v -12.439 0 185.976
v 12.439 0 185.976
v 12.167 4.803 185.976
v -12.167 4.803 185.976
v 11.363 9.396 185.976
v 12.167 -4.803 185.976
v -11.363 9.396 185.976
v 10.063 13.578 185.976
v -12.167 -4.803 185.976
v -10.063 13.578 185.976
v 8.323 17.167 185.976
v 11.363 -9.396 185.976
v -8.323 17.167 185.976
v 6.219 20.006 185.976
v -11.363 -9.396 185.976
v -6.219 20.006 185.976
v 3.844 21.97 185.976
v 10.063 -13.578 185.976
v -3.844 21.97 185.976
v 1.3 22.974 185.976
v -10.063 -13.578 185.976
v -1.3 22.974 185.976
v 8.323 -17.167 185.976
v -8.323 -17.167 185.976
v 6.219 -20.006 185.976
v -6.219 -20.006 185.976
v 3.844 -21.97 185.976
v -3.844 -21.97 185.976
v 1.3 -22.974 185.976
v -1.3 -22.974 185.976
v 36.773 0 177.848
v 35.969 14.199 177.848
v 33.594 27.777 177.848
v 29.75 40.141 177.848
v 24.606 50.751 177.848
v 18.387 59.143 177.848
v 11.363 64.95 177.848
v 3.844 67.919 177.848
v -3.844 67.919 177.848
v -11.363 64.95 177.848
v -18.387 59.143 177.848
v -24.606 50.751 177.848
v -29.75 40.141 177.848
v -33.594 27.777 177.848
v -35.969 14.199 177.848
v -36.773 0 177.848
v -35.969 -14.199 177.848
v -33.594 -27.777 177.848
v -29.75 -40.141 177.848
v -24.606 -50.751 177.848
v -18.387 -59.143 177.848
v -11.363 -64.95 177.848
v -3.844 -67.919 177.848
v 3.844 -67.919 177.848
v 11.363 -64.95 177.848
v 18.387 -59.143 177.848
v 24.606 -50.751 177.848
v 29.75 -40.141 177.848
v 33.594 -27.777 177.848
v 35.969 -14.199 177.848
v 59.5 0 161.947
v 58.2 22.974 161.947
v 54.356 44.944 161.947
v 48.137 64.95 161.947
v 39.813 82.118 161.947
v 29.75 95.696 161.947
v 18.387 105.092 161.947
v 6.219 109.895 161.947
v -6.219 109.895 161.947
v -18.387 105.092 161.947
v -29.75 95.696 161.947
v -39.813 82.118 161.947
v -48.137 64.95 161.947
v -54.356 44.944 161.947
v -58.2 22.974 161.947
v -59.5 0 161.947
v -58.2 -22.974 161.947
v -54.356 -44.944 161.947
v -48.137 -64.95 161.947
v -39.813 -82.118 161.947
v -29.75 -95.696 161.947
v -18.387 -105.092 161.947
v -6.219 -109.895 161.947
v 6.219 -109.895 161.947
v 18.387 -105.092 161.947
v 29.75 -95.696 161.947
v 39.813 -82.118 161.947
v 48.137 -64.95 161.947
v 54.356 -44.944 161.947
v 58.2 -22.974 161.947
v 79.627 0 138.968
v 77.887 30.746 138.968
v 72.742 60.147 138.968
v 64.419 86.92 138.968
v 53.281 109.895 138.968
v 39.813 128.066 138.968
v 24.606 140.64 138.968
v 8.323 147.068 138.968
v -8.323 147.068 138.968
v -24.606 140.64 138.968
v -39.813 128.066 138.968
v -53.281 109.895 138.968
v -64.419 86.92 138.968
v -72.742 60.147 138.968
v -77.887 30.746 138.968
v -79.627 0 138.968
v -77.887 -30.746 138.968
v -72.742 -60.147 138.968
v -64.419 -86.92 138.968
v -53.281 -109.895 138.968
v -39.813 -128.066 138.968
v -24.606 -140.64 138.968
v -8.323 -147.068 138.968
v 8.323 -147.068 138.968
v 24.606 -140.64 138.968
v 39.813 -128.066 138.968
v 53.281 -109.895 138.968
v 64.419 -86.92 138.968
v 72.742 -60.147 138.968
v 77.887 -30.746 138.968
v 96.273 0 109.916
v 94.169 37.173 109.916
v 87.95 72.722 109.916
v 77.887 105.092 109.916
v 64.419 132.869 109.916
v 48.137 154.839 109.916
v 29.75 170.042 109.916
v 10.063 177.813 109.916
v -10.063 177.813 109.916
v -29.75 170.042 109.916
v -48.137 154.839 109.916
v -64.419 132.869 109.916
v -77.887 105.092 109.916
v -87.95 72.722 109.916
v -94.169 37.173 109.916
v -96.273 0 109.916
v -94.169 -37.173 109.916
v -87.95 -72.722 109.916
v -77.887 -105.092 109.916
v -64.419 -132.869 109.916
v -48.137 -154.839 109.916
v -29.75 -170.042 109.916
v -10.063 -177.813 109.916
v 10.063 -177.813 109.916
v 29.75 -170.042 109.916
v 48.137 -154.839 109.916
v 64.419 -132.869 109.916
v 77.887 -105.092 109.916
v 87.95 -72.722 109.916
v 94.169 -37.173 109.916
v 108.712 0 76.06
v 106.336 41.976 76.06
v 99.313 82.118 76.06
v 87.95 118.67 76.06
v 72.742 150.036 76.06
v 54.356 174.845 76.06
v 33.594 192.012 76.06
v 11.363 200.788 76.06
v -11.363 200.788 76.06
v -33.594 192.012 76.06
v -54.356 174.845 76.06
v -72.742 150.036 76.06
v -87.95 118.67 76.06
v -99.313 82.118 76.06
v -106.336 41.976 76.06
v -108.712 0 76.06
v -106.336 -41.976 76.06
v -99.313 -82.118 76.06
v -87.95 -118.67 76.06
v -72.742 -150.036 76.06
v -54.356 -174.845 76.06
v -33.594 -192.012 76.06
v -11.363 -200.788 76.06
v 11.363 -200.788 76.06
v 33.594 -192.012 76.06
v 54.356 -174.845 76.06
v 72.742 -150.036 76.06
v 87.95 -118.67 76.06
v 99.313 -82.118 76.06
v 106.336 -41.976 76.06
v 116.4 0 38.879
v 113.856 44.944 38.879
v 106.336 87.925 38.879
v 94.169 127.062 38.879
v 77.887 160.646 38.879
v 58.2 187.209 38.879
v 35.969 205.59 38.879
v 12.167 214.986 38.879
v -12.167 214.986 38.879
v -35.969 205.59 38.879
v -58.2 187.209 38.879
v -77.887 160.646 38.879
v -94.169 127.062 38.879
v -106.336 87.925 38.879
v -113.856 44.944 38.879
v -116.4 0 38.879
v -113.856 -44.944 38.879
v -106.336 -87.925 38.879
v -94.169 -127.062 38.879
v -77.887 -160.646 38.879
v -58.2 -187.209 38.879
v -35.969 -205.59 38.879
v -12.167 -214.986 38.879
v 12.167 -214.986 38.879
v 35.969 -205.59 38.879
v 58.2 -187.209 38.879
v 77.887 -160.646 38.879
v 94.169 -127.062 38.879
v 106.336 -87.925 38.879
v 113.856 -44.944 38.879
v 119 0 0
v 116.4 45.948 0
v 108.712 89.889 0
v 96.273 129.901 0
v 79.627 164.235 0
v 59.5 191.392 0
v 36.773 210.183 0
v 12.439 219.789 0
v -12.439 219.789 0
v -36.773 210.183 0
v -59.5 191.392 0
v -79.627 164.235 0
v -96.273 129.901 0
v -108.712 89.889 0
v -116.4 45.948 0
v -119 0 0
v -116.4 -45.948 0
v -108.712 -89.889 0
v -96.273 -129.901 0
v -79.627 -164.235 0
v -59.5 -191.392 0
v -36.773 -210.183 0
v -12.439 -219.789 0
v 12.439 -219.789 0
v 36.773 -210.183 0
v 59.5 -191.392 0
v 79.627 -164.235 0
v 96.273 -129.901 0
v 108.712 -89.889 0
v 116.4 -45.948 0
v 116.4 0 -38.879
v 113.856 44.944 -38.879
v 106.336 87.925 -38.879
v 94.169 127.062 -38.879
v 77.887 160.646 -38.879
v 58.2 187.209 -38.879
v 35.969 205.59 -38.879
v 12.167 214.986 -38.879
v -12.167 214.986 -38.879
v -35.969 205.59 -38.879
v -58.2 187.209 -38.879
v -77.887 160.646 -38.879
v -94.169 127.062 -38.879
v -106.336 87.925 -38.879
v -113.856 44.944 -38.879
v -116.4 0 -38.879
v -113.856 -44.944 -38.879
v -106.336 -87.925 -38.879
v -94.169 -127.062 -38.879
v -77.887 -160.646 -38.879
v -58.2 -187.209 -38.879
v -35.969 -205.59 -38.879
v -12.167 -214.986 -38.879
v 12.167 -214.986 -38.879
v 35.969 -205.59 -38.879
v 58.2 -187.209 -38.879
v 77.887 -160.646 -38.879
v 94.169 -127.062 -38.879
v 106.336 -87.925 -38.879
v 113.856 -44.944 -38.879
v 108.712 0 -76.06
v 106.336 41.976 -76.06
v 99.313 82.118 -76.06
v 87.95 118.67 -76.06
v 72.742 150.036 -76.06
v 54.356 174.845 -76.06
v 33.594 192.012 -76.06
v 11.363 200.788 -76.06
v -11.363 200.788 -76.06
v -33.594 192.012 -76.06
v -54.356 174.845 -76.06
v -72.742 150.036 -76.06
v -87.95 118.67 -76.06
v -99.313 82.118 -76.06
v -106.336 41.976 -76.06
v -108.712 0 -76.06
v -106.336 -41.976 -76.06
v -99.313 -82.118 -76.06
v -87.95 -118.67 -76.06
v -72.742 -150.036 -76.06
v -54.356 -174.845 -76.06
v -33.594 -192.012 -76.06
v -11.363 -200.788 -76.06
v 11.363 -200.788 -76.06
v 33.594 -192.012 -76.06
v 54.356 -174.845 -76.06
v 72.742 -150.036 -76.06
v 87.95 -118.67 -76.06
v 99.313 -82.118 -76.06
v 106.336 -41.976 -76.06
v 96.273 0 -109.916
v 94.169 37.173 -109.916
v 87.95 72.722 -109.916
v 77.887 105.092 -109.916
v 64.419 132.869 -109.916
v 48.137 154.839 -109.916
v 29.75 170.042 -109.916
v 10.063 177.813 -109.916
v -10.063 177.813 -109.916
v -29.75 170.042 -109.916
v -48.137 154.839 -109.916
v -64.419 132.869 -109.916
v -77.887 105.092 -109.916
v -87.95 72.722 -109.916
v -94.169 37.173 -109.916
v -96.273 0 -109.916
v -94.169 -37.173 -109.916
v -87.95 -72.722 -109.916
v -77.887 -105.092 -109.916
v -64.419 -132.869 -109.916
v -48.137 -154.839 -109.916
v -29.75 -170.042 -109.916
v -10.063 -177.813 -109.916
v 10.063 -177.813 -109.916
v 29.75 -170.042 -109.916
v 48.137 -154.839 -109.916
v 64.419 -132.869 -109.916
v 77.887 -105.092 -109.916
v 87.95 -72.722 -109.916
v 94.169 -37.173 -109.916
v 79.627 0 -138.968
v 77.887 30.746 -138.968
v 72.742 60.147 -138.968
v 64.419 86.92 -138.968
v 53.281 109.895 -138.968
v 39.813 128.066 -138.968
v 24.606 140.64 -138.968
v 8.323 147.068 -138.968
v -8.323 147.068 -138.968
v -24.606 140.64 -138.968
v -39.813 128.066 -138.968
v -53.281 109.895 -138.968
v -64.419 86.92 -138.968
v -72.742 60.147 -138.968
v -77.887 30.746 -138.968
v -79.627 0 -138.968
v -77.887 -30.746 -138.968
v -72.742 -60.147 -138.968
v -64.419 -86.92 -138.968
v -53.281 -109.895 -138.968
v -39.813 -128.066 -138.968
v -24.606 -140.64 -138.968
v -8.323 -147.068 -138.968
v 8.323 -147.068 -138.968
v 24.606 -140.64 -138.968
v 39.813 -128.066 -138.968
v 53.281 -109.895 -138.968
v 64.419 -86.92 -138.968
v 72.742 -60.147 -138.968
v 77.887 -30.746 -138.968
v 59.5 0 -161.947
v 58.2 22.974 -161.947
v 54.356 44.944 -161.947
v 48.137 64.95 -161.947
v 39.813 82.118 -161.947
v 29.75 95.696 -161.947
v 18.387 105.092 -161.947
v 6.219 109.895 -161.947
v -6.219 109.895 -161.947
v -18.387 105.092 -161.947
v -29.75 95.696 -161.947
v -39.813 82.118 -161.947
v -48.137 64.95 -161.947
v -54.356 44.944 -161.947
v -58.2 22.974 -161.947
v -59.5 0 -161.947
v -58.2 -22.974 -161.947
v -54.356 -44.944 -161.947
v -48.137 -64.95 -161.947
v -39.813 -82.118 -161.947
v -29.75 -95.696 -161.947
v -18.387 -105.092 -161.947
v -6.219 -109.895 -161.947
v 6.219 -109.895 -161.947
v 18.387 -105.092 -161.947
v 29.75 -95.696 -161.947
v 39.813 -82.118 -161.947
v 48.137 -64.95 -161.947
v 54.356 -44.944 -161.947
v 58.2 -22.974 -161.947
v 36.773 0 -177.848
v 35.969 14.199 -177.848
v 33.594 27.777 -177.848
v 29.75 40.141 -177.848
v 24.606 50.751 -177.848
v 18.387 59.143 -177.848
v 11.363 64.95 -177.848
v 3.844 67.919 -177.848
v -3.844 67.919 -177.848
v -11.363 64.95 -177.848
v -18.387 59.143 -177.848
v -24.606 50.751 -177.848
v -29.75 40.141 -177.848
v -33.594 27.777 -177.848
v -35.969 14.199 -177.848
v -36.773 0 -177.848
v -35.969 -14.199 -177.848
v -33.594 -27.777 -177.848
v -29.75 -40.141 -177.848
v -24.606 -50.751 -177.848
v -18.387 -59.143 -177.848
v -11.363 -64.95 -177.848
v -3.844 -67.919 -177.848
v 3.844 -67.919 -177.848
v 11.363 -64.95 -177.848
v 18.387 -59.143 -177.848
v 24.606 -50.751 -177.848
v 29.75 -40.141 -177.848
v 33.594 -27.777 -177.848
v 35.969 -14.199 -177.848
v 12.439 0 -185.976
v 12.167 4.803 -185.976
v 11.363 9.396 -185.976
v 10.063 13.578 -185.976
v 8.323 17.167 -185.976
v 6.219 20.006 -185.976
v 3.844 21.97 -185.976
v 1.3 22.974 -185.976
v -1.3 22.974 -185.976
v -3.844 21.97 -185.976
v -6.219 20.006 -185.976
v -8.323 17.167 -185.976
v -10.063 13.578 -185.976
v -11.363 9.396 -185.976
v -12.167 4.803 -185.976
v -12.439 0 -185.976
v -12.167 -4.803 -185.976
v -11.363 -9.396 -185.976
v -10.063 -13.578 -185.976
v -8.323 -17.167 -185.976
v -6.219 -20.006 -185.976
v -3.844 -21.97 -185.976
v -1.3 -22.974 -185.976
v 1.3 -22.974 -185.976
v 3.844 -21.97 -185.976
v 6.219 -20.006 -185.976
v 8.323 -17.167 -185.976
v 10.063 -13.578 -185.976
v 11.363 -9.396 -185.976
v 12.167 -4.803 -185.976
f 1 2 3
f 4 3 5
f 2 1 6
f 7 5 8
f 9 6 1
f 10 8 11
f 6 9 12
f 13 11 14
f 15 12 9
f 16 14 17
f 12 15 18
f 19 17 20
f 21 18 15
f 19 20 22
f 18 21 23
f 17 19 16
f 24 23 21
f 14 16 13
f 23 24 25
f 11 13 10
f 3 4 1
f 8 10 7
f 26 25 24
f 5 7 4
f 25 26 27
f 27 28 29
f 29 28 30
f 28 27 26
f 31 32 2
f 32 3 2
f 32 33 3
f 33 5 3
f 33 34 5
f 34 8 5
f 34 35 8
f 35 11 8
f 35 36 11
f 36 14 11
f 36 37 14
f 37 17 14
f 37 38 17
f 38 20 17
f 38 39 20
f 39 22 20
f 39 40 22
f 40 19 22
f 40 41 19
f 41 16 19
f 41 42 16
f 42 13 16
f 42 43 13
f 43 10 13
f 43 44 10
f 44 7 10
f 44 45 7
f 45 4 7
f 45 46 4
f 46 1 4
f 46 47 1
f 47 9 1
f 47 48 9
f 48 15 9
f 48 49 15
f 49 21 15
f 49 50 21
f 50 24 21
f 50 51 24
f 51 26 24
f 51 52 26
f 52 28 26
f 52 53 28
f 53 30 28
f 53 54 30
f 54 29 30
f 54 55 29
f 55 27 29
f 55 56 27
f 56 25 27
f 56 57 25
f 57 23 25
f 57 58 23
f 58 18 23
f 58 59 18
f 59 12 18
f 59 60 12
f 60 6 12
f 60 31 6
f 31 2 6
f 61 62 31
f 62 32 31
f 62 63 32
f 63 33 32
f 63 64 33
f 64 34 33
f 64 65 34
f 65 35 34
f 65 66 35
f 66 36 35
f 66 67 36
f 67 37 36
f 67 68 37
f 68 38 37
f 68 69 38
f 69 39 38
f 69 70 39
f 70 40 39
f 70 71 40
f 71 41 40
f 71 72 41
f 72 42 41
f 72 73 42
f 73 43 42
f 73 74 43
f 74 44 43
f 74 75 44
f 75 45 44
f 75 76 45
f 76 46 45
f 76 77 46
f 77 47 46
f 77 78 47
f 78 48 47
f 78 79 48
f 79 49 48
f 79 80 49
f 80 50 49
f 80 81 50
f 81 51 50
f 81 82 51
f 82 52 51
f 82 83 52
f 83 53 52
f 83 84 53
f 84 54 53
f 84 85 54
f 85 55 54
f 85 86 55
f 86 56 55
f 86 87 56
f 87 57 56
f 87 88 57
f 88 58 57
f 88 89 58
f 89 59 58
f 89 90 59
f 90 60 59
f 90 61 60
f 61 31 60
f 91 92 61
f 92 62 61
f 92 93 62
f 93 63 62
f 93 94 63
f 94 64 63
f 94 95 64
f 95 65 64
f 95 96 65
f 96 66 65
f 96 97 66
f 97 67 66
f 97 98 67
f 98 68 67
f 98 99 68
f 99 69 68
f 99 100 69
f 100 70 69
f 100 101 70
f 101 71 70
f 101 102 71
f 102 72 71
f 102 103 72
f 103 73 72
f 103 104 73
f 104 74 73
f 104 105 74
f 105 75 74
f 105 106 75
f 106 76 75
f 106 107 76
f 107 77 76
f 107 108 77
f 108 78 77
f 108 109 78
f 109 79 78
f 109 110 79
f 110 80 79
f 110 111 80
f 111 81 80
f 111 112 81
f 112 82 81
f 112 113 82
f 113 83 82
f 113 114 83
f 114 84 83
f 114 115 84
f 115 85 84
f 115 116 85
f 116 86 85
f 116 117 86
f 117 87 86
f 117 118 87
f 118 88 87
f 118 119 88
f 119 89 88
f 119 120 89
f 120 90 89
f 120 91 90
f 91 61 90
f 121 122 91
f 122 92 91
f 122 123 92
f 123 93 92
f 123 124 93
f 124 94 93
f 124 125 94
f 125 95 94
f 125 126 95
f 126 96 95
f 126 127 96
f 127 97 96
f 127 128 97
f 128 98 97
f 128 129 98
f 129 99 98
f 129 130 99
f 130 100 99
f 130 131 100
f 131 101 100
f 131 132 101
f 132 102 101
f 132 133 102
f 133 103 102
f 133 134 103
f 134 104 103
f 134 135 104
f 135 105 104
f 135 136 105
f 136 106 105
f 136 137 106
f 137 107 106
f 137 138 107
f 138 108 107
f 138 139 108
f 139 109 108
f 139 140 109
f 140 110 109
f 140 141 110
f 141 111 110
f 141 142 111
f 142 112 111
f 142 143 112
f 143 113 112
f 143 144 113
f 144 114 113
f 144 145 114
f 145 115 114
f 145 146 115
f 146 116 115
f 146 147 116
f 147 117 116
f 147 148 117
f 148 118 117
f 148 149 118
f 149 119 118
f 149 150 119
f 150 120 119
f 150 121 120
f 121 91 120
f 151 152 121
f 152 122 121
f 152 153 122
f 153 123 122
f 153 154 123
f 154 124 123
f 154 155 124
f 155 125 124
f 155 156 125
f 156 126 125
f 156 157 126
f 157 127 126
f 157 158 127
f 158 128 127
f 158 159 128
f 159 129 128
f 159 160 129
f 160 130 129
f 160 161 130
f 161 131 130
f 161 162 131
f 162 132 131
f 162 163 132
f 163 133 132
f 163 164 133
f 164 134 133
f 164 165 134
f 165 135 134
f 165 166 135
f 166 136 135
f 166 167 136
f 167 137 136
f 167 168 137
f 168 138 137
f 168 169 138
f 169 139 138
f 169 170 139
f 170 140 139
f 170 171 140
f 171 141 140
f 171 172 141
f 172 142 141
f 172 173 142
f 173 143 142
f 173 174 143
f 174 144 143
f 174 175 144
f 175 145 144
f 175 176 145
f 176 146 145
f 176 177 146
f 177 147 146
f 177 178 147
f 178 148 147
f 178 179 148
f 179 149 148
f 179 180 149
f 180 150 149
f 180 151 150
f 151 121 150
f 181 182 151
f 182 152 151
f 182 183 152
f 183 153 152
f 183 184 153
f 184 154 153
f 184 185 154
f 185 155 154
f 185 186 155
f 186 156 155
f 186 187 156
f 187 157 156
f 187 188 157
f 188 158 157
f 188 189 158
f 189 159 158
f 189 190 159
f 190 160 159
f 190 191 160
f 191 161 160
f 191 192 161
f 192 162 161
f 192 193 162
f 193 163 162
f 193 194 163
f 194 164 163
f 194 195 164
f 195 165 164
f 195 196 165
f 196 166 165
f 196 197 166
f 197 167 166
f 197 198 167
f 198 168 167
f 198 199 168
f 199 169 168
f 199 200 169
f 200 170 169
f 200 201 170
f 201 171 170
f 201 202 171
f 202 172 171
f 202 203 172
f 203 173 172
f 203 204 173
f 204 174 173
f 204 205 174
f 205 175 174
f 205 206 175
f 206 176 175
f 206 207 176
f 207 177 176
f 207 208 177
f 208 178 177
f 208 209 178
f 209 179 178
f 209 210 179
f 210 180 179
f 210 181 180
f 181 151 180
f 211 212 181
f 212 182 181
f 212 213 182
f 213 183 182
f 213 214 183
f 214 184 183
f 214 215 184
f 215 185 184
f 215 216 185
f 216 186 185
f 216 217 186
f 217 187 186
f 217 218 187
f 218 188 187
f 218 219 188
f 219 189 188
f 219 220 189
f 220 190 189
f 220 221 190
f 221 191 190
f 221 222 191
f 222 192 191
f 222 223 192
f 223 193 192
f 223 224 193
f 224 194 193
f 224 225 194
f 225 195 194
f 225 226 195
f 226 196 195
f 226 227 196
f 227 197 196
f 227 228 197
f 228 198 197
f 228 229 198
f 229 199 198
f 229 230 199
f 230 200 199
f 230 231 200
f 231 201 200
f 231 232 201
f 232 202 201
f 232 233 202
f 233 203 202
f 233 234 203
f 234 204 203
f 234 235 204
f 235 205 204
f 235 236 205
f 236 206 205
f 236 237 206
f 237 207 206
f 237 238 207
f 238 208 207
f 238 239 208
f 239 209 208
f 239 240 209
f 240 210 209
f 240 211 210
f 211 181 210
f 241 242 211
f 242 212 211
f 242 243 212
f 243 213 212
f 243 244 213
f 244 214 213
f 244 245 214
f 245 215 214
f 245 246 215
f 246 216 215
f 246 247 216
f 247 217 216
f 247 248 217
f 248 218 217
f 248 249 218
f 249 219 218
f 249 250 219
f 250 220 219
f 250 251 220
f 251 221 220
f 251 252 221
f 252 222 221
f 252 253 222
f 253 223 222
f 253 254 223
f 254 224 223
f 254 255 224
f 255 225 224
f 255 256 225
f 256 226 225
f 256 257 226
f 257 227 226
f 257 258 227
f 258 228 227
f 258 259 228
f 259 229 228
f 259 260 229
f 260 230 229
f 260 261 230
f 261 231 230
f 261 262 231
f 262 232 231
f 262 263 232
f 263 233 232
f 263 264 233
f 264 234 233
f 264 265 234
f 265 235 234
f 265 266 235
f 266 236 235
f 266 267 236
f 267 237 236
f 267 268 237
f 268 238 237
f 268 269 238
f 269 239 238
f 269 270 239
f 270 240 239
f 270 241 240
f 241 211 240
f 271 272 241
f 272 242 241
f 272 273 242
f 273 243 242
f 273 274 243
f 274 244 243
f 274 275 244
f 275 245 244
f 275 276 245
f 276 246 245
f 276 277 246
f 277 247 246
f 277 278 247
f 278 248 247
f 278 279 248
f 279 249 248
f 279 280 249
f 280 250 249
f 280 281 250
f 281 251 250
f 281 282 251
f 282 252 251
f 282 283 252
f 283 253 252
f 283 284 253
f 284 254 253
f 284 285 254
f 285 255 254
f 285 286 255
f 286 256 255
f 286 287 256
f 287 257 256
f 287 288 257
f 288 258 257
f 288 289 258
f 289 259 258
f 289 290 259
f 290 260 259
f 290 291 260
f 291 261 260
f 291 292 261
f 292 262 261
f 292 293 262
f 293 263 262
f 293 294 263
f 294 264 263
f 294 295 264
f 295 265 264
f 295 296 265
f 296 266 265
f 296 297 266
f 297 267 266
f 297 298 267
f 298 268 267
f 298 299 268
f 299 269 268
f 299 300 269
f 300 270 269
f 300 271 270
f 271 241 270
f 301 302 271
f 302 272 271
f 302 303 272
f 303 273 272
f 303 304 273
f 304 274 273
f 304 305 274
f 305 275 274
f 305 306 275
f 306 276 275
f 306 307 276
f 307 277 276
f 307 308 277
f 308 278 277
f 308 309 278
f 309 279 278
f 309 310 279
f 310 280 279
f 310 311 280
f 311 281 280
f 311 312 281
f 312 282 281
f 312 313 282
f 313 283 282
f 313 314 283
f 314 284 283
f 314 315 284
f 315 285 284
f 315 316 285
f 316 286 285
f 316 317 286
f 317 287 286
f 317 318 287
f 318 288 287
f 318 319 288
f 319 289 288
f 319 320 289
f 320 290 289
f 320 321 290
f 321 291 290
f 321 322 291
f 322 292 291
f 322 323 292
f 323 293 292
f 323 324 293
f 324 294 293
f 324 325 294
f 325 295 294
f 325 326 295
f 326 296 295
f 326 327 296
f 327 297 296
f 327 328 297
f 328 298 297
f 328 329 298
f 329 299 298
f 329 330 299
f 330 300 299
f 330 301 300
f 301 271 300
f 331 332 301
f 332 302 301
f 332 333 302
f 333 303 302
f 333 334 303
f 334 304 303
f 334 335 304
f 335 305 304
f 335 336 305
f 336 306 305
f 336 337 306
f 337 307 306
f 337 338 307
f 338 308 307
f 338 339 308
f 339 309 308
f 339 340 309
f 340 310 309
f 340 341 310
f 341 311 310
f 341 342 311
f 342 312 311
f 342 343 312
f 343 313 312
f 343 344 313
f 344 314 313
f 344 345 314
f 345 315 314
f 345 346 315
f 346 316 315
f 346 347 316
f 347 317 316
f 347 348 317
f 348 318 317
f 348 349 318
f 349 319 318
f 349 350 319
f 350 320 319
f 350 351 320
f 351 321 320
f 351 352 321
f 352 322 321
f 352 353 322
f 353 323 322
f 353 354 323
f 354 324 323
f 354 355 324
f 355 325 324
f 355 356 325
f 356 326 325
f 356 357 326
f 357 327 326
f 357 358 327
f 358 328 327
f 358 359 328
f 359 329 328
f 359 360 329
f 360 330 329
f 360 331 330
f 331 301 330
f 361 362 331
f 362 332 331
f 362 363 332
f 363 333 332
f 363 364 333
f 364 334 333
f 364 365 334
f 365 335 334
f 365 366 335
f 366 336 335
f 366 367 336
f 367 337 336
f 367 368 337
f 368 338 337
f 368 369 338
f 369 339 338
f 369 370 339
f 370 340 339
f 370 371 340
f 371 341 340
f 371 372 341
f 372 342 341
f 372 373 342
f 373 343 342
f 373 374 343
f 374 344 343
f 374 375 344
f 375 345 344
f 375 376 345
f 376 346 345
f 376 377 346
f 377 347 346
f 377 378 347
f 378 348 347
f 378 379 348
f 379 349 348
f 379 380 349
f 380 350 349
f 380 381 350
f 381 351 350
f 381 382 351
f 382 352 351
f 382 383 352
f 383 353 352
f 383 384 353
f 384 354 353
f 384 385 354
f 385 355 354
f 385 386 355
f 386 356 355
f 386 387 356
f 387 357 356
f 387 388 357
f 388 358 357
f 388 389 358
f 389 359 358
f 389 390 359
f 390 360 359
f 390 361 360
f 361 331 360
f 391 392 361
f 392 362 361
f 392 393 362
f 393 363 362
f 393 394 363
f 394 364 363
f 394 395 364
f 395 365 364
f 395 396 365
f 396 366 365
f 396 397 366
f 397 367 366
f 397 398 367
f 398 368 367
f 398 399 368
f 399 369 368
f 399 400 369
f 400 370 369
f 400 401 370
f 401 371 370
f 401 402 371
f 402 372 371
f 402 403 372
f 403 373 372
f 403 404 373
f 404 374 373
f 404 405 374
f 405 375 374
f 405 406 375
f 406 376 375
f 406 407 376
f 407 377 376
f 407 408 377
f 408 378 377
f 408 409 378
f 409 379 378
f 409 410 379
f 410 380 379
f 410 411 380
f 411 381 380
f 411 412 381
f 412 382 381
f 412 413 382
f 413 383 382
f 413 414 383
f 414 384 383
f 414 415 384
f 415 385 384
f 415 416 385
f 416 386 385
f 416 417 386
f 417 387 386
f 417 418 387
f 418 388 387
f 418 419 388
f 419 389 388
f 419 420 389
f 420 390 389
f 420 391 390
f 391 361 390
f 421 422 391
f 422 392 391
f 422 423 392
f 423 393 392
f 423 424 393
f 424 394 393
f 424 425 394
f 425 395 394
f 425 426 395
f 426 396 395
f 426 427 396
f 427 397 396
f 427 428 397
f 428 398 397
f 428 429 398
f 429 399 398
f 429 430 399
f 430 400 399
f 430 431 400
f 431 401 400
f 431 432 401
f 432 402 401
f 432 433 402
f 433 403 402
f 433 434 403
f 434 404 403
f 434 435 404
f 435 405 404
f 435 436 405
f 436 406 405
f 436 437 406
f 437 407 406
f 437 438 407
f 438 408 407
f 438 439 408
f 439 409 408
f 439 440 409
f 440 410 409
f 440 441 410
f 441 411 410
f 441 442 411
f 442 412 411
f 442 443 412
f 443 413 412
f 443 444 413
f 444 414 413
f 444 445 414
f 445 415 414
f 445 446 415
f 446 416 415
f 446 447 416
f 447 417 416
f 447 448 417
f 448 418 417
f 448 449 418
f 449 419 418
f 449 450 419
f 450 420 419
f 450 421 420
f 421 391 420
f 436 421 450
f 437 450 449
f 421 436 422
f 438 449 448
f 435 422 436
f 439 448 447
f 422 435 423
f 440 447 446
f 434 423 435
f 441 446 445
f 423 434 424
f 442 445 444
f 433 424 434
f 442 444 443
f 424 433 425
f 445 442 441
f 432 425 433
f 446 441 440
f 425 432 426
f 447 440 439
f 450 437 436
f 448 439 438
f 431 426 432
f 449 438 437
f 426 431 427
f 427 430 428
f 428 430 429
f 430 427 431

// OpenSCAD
// Generated by SolidPython 1.0.1 on 2020-07-29 00:46:47


scale(v = [7, 13, 11]) {
	sphere(r = 17);
}
/***********************************************
*********      SolidPython code:      **********
************************************************
 
# import packages: SolidPython
from solid import *
from solid.utils import *
from itertools import chain, combinations, permutations


class Resize:

    def __init__(self, scad_file):
        self.scad_file = scad_file
        #self.scad_file = import_scad(scad_file)
        # cone/cylinder param:
        self.r1 = 0
        self.r2 = 0
        self.h = 0
        # rectangular prism param:
        self.w = 0
        self.l = 0
        # ellipse param:
        self.r = 0

    # import OpenScad code (file name corresponds to shape)


    # classify shape + parameters
    def assign(self, param1, param2, param3):
        if self.scad_file == 'cone.scad':
            self.r1 = param1
            self.r2 = param2
            self.h = param3
        elif self.scad_file == 'cylinder.scad':
            self.r1 = param1
            self.r2 = param2
            self.h = param3
        elif self.scad_file == 'rectangularPrism.scad':
            self.h = param1
            self.l = param2
            self.w = param3
        else:
            self.r = param1
            self.h = param2

    # resize parameters
    def iterate(self):
        x = range(3, 20, 2)
        i = 1
        if self.scad_file == 'cone.scad':
            tempList = list(permutations(x, 2))
            for temp in tempList:
                param1 = temp[0]
                param2 = temp[1]
                filepath = 'produced_scad_files/' + 'cone' + str(param1) + '_' + str(param2) + '_' + '.scad'
                scad_render_to_file(cylinder(h=param1, r1=param2, r2=0), filepath)

        elif self.scad_file == 'cylinder.scad':
            tempList = list(permutations(x, 3))
            for temp in tempList:
                param1 = temp[0]
                param2 = temp[1]
                filepath = 'produced_scad_files/' + 'cylinder' + str(param1) + '_' + str(param2) + '_' + '.scad'
                scad_render_to_file(cylinder(h=param1, r1=param2, r2=param2), filepath)

        elif self.scad_file == 'rectangularPrism.scad':
            tempList = list(permutations(x, 3))
            for temp in tempList:
                param1 = temp[0]
                param2 = temp[1]
                param3 = temp[2]
                filepath = 'produced_scad_files/' + 'rectangularPrism' + str(param1) + '_' + str(param2) + '_' + str(
                    param3) + '.scad'
                scad_render_to_file(cube(size=(param1, param2, param3)), filepath)

        elif self.scad_file == 'ellipse.scad':
            tempList = list(permutations(x, 4))
            for temp in tempList:
                param1 = temp[0]
                param2 = temp[1]
                param3 = temp[2]
                param4 = temp[3]
                filepath = 'produced_scad_files/' + 'ellipse' + str(param1) + '_' + str(param2) + '_' + str(param3) + '_' + str(param4) + '.scad'
                scad_render_to_file(scale([param1, param2, param3])(sphere(r=param4)), filepath)

    def render_to_scadfile(self):
        scad_render_to_file(scad, 'example.scad') 
 
************************************************/
